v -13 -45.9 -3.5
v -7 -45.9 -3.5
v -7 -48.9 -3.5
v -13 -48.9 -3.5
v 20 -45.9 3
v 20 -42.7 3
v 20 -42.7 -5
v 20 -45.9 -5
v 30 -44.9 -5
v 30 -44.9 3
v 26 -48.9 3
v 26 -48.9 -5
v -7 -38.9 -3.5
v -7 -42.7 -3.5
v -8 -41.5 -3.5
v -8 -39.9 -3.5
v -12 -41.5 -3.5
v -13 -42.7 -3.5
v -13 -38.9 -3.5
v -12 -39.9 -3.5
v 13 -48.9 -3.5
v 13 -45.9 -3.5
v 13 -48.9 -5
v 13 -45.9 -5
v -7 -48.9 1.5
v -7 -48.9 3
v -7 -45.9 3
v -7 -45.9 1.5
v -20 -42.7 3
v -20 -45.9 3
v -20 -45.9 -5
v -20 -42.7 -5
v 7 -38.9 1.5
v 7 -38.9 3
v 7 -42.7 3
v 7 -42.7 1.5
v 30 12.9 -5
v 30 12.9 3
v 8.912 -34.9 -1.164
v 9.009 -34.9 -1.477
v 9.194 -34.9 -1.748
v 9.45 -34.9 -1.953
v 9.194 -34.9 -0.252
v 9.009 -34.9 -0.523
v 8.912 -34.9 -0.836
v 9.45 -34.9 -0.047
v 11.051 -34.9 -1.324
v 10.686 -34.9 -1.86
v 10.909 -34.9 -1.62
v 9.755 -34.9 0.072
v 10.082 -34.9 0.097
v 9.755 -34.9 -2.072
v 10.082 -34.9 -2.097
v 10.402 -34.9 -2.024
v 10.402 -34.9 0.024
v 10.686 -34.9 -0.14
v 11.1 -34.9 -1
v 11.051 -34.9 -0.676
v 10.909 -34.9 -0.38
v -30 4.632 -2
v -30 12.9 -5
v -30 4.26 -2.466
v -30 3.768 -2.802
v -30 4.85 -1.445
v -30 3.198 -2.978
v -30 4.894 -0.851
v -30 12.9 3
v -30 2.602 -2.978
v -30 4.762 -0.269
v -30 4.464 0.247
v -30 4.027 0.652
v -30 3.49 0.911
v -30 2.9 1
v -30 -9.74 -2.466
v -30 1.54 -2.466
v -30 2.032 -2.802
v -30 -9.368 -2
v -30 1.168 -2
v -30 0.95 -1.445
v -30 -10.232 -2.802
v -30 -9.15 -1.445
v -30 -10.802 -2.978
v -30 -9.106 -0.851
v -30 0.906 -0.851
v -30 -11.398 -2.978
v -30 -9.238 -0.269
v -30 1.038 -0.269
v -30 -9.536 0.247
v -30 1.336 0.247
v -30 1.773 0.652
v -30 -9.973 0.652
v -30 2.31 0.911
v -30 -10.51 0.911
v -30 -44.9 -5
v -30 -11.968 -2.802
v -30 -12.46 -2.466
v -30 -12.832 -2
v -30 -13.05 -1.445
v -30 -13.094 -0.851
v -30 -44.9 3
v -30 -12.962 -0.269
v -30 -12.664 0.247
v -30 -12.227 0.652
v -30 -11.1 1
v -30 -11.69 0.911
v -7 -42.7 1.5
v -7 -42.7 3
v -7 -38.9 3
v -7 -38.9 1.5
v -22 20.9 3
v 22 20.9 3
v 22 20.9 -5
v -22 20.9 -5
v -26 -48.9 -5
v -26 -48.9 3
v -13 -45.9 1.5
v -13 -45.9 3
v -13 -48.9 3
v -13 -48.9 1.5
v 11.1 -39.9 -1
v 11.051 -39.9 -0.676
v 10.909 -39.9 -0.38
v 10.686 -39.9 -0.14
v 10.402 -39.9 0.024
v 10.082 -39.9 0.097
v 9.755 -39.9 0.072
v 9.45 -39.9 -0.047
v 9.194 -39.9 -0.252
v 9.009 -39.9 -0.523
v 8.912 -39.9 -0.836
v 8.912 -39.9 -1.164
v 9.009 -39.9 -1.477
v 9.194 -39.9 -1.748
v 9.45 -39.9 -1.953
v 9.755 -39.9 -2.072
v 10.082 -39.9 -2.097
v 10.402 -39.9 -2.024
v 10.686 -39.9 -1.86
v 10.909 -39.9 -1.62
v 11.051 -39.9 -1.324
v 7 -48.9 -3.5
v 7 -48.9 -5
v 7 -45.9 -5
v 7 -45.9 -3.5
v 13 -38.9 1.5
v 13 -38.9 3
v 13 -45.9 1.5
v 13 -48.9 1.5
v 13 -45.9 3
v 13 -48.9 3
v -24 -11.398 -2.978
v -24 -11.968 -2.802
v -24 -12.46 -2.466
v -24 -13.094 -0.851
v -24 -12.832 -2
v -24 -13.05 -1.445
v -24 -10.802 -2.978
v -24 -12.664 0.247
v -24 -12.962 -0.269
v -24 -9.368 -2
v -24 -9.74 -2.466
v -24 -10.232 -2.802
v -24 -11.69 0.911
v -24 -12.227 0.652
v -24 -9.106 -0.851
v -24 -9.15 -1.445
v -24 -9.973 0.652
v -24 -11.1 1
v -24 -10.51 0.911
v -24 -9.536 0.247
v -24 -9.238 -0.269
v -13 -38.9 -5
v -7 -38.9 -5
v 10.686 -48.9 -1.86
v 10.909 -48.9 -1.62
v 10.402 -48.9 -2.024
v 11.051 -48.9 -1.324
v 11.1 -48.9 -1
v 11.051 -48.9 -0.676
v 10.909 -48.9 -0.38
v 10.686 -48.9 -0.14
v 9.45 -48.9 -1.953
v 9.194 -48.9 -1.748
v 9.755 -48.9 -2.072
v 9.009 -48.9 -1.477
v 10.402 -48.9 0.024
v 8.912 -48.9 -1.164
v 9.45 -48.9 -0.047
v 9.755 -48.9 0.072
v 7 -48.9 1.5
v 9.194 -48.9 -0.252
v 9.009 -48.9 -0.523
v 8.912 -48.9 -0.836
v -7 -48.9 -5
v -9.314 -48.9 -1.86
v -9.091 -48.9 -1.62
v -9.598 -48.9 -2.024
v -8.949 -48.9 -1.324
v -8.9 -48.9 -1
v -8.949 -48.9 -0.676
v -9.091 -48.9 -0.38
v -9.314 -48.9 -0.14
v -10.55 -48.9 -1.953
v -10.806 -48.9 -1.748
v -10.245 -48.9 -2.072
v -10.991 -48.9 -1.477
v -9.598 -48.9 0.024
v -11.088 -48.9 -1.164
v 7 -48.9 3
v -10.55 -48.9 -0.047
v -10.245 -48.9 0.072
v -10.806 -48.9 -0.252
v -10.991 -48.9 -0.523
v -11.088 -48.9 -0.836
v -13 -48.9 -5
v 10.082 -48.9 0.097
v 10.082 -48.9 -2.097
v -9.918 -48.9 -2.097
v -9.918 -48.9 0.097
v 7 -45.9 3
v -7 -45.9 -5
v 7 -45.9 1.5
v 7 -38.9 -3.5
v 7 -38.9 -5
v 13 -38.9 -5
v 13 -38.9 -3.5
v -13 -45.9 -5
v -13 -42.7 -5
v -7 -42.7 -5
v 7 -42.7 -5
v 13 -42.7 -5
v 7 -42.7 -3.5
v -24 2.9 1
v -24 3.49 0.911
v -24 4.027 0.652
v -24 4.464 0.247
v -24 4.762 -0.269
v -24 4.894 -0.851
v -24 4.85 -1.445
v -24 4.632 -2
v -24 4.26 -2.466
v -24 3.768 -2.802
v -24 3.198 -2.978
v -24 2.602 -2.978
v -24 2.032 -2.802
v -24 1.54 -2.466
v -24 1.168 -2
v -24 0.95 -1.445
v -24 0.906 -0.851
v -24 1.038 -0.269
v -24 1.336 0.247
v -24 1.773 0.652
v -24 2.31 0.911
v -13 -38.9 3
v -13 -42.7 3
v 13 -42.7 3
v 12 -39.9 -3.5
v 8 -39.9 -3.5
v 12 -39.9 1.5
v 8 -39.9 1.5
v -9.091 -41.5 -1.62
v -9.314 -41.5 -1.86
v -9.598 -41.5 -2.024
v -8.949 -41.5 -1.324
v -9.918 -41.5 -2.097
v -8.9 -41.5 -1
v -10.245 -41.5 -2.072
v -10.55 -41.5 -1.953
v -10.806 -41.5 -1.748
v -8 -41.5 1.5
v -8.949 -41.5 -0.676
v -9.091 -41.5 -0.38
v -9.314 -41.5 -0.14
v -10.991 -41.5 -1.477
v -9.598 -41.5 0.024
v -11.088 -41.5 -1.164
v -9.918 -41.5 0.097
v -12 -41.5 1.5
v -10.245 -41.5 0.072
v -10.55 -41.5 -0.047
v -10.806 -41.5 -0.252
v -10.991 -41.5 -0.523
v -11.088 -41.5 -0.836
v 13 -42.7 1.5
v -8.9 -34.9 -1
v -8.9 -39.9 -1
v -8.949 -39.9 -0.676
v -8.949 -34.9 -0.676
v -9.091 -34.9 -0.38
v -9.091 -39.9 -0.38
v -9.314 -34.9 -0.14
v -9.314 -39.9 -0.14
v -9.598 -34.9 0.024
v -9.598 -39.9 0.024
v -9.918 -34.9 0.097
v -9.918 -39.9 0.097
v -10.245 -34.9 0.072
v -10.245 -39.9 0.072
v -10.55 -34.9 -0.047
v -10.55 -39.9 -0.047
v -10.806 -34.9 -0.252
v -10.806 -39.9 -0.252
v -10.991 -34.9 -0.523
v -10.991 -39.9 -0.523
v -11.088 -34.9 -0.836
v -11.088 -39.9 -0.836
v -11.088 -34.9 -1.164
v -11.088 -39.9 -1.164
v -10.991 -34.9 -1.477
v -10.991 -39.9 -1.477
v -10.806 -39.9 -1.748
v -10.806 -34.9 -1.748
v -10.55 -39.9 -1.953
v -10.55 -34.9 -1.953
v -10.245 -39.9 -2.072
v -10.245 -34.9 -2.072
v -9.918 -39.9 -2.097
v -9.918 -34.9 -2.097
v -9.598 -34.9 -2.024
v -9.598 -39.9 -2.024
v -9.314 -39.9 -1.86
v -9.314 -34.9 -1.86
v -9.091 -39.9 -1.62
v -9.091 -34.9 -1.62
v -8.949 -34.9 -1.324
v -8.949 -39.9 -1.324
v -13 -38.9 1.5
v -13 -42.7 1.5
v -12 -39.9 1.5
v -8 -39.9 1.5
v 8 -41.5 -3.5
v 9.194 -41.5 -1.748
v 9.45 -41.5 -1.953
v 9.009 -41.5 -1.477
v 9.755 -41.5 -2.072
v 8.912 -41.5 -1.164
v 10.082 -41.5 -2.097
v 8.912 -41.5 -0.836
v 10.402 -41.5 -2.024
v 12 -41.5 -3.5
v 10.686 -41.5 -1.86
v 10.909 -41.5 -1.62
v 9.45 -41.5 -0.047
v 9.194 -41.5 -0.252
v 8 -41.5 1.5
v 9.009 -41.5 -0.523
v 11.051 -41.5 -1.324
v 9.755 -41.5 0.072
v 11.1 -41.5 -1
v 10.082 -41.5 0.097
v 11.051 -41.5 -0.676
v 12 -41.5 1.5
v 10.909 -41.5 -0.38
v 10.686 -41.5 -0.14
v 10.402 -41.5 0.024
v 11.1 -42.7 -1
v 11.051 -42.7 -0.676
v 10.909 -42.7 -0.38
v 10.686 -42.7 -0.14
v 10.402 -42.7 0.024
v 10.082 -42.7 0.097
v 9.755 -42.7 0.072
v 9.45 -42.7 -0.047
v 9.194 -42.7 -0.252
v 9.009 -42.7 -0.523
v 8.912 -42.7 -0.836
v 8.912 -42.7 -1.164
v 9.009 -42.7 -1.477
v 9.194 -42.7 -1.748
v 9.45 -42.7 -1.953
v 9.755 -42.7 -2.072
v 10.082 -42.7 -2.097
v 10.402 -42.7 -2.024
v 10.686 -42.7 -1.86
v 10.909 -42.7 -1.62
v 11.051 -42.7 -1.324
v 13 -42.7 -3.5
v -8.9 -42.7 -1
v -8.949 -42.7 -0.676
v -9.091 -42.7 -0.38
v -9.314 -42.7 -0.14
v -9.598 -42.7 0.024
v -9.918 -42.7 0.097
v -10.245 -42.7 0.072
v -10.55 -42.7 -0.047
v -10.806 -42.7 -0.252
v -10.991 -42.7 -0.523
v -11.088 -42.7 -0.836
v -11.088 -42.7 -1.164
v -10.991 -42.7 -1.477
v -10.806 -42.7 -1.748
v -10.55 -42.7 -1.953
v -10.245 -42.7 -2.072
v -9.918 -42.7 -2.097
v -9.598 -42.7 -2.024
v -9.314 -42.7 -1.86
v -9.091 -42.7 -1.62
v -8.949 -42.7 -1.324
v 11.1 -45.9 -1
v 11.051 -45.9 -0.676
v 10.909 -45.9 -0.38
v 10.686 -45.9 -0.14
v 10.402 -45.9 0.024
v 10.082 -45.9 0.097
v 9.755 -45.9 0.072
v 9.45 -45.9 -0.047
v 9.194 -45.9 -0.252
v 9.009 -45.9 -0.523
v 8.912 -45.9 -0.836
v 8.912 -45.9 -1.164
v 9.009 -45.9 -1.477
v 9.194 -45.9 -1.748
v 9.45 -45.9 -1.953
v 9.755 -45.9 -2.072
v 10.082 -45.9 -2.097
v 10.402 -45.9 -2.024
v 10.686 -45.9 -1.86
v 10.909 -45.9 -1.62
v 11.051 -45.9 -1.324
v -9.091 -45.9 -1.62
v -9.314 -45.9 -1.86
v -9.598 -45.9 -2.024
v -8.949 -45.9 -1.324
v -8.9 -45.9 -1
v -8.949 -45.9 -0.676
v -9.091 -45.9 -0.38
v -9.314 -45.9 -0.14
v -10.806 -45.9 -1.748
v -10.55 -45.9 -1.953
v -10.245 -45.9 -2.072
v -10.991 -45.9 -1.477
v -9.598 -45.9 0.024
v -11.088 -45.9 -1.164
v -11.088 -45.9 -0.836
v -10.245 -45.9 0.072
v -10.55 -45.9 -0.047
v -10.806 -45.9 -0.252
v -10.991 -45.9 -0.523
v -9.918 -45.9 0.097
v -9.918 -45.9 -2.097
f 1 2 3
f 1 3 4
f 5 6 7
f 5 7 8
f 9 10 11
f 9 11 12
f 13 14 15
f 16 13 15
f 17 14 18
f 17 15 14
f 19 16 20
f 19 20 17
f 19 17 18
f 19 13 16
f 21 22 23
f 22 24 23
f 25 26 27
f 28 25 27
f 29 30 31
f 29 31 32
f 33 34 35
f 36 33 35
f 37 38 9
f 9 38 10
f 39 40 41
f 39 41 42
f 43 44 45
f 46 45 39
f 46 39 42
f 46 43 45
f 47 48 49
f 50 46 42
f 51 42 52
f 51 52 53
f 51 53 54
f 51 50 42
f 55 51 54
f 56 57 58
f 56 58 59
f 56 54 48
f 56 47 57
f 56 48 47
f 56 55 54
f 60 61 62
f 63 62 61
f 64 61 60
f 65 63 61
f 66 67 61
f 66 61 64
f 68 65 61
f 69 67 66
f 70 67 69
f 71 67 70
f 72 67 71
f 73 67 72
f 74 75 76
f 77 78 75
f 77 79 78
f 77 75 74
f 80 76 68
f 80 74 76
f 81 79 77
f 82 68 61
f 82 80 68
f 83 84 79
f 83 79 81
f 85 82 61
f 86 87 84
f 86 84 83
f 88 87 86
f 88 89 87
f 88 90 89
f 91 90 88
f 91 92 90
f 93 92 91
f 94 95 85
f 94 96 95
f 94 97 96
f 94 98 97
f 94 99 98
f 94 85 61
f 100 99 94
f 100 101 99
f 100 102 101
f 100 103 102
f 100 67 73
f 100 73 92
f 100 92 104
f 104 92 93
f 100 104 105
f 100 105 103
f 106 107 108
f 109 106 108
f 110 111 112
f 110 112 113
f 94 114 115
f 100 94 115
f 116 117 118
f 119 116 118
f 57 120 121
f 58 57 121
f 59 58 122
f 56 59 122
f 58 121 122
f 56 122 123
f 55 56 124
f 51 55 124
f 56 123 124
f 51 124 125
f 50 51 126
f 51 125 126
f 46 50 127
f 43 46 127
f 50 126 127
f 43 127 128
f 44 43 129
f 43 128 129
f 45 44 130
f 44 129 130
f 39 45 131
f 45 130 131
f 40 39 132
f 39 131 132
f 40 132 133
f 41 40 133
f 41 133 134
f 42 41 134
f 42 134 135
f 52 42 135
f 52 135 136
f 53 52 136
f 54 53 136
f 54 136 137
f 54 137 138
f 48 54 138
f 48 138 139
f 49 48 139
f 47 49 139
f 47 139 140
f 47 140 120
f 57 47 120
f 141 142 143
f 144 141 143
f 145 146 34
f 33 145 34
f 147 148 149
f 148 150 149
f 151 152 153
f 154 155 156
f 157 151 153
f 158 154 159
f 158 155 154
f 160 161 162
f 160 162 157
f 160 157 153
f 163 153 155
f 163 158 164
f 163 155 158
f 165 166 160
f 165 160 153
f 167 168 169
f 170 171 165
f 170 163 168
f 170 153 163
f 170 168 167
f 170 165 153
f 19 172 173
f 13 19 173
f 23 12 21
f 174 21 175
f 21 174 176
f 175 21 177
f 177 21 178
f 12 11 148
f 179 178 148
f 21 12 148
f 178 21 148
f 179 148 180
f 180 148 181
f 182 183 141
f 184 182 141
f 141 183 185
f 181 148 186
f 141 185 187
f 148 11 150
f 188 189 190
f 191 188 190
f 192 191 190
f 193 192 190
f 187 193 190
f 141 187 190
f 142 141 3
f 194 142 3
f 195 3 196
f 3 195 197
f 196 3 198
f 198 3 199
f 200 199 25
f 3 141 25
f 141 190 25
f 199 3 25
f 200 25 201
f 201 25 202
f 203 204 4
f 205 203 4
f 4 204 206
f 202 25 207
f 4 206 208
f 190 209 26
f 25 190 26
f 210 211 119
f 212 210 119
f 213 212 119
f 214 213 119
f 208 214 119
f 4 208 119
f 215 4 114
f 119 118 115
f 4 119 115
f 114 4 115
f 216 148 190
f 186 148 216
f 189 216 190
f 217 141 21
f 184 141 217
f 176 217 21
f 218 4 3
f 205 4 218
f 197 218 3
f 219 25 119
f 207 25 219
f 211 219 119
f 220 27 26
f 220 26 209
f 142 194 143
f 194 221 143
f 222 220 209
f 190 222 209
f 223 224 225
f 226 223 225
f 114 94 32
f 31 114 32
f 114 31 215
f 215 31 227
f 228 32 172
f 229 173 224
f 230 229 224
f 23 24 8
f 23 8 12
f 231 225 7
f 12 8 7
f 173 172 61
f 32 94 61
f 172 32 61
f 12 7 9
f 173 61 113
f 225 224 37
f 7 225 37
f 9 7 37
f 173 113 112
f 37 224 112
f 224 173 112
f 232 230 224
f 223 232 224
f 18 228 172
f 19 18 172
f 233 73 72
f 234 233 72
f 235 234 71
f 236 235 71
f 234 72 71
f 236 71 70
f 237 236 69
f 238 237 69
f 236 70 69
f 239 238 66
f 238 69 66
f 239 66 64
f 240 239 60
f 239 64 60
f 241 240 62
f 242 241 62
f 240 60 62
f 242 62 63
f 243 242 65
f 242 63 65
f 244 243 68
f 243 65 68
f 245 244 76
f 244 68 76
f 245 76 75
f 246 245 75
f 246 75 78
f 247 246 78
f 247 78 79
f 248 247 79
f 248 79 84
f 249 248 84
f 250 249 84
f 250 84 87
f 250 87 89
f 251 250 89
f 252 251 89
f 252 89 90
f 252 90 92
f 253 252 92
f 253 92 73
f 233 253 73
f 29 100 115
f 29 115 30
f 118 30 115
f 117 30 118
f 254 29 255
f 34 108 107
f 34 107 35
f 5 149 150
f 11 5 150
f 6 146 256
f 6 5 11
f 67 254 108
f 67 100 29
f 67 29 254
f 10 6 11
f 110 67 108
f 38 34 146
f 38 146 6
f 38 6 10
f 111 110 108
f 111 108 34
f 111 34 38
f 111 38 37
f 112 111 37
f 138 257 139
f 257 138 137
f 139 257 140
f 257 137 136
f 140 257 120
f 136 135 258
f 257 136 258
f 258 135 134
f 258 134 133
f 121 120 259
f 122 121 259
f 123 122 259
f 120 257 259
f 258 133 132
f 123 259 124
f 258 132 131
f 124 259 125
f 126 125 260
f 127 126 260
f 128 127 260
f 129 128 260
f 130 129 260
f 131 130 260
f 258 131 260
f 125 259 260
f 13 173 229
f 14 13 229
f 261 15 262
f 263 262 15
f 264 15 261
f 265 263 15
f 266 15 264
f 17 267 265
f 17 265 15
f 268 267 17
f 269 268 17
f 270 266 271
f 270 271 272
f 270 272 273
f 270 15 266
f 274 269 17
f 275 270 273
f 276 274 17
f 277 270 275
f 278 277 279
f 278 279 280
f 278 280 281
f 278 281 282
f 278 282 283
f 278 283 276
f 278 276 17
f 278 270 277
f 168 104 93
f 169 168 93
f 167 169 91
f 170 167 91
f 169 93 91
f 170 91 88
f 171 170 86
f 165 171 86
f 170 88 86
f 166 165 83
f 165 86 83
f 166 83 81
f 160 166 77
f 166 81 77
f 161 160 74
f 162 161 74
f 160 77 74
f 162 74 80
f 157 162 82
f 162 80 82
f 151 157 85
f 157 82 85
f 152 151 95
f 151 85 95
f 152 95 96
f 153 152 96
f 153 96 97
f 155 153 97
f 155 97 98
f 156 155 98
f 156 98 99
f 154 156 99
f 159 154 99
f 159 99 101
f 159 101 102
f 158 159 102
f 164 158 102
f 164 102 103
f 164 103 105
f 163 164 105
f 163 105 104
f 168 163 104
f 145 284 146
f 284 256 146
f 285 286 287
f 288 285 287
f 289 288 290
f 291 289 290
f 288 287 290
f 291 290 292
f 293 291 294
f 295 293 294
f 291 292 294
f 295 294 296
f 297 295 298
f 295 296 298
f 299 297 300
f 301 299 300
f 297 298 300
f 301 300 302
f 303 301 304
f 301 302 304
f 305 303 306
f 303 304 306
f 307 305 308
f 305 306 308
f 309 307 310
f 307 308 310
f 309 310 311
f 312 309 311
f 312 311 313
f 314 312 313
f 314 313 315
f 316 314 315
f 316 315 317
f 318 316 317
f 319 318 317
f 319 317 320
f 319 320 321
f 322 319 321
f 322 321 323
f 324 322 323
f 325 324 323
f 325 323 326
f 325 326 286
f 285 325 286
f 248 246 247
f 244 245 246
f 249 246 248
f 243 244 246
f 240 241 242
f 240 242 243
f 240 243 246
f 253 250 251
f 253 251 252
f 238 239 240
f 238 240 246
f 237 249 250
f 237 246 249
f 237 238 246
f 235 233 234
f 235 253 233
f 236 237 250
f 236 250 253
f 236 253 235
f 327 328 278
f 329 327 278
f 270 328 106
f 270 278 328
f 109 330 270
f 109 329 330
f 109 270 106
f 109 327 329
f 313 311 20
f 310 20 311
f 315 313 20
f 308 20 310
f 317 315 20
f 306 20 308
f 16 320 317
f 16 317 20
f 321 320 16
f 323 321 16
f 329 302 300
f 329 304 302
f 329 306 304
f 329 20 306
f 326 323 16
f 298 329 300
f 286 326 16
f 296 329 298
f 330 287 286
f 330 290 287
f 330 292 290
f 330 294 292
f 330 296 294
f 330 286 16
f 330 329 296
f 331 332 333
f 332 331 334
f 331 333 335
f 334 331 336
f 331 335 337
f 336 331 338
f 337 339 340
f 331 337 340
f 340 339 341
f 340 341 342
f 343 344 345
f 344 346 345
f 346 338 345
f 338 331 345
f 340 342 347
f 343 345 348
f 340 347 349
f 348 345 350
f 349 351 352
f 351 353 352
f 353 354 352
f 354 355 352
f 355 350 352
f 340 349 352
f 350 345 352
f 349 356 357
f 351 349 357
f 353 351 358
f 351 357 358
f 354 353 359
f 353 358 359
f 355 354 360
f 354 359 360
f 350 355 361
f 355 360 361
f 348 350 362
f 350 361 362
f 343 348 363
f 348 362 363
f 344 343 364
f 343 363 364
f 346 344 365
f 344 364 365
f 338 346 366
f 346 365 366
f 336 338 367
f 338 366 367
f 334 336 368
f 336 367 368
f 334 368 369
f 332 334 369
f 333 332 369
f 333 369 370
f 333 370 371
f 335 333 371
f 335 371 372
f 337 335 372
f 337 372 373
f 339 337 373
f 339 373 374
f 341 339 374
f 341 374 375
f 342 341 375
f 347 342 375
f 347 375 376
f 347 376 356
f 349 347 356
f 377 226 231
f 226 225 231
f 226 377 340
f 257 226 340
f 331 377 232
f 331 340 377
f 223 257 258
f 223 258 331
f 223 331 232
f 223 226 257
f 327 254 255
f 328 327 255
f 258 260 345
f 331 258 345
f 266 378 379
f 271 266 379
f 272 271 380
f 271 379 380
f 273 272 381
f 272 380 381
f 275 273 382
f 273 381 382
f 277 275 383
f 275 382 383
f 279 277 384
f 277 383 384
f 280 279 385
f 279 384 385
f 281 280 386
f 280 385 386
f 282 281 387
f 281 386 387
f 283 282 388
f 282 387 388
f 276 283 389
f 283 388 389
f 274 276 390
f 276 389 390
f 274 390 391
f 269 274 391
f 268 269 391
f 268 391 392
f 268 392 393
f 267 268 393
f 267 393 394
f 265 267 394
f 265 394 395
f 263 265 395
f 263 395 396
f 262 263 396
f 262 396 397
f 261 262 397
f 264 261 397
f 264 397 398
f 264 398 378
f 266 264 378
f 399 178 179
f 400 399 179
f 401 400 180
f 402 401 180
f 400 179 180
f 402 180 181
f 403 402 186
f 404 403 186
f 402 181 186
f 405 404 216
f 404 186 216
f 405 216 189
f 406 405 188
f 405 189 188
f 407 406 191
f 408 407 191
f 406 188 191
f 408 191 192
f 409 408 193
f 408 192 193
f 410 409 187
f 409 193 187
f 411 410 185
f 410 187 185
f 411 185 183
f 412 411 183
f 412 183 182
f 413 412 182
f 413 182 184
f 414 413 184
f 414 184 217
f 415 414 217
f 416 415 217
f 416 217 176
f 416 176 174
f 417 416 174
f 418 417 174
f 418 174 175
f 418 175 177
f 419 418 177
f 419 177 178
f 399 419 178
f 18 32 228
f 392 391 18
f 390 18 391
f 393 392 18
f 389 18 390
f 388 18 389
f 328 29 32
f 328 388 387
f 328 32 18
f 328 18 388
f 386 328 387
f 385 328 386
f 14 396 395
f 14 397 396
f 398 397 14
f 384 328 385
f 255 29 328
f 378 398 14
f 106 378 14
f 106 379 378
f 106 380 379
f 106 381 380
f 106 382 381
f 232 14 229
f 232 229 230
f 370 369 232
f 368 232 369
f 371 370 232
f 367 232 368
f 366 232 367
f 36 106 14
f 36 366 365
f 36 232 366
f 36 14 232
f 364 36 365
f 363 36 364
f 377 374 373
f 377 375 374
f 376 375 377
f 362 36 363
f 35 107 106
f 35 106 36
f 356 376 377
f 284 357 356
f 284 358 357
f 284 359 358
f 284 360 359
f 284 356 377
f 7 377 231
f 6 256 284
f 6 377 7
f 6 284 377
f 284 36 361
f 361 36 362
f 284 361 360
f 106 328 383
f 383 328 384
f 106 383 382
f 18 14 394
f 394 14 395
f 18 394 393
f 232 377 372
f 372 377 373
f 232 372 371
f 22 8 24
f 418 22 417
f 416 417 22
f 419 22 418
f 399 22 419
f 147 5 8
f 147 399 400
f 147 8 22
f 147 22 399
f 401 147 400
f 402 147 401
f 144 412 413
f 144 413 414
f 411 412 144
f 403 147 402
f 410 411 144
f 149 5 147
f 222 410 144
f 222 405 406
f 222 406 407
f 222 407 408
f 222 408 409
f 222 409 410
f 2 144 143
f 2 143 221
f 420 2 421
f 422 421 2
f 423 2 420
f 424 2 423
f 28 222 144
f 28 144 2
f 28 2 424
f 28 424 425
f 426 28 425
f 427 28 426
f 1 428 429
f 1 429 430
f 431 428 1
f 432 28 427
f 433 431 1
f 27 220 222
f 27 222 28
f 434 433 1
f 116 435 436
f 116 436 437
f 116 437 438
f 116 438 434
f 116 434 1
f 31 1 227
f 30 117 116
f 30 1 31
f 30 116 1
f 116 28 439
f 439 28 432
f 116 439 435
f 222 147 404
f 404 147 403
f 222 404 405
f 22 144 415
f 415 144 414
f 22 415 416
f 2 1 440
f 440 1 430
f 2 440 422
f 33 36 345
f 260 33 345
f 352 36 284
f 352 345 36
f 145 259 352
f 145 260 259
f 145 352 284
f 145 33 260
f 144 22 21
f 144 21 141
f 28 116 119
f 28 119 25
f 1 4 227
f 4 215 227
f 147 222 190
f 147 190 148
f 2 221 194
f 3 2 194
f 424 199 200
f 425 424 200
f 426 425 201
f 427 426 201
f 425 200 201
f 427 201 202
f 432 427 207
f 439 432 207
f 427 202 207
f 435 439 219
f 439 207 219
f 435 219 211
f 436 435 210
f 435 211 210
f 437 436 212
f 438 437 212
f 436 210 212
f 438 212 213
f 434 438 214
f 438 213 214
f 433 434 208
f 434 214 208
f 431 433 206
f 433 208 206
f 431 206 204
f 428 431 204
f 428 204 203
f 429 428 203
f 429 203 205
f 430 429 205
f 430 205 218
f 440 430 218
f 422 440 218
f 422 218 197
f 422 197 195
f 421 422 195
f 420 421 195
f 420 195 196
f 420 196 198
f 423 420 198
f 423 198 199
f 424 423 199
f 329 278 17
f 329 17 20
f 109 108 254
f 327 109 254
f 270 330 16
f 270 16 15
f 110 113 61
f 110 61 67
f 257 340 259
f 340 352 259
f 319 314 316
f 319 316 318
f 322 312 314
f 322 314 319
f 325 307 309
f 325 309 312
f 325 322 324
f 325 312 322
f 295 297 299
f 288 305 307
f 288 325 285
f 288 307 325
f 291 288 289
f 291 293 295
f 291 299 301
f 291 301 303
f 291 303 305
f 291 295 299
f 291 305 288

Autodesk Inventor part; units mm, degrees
ref_plane "YZ Plane" through (0, 0, 0) normal (1, 0, 0) x (0, 1, 0)
sketch "Эскиз1" plane through (0, 0, 0) normal (0, 0, 1) x (1, 0, 0)
  line L0 (16.9838, 20.6364) -> (20.6364, 16.9838) projected
  arc A0 (16.9838, 20.6364) -> (16.3474, 20.9) centre (16.3474, 20) ccw projected
  line L1 (-16.3474, 20.9) -> (16.3474, 20.9) projected
  arc A1 (-16.3474, 20.9) -> (-16.9838, 20.6364) centre (-16.3474, 20) ccw projected
  line L2 (-20.6364, 16.9838) -> (-16.9838, 20.6364) projected
  arc A2 (-20.6364, 16.9838) -> (-20.9, 16.3474) centre (-20, 16.3474) ccw projected
  line L3 (-20.9, -16.3474) -> (-20.9, 16.3474) projected
  arc A3 (-20.9, -16.3474) -> (-20.6364, -16.9838) centre (-20, -16.3474) ccw projected
  line L4 (-16.9838, -20.6364) -> (-20.6364, -16.9838) projected
  arc A4 (-16.9838, -20.6364) -> (-16.3474, -20.9) centre (-16.3474, -20) ccw projected
  line L5 (16.3474, -20.9) -> (-16.3474, -20.9) projected
  arc A5 (16.3474, -20.9) -> (16.9838, -20.6364) centre (16.3474, -20) ccw projected
  line L6 (20.6364, -16.9838) -> (16.9838, -20.6364) projected
  arc A6 (20.6364, -16.9838) -> (20.9, -16.3474) centre (20, -16.3474) ccw projected
  line L7 (20.9, 16.3474) -> (20.9, -16.3474) projected
  arc A7 (20.9, 16.3474) -> (20.6364, 16.9838) centre (20, 16.3474) ccw projected
  circle A8 centre (15.5574, -15.5574) radius 1.45 projected
  circle A9 centre (0, 0) radius 11 projected
  circle A10 centre (-15.5574, -15.5574) radius 1.45 projected
  circle A11 centre (-15.5574, 15.5574) radius 1.45 projected
  circle A12 centre (15.5574, 15.5574) radius 1.45 projected
  point P0 (0, 0)
extrude "Выдавливание1" add sketch "Эскиз1" along normal blind 3
sketch "Эскиз2" plane through (0, 0, 3) normal (0, 0, 1) x (1, 0, 0)
  line L0 (16.3474, 20.9) -> (-16.3474, 20.9) construction
  line L1 (-30, -20.9) -> (30, -20.9)
  line L2 (30, -20.9) -> (30, 20.9)
  line L3 (30, 20.9) -> (-30, 20.9)
  line L4 (-30, 20.9) -> (-30, -20.9)
  circle A0 centre (0, 0) radius 11 construction
  line L5 (-30, -20.9) -> (30, 20.9) construction
  line L6 (30, -20.9) -> (-30, 20.9) construction
  line L7 (-30, -20.9) -> (30, -20.9)
  line L8 (30, -20.9) -> (30, -48.9)
  line L9 (30, -48.9) -> (-30, -48.9)
  line L10 (-30, -48.9) -> (-30, -20.9)
  line L11 (-16.9838, 20.6364) -> (-20.6364, 16.9838) projected
  arc A1 (-20.6364, 16.9838) -> (-20.9, 16.3474) centre (-20, 16.3474) ccw projected
  line L12 (-20.9, 16.3474) -> (-20.9, -16.3474) projected
  arc A2 (-20.9, -16.3474) -> (-20.6364, -16.9838) centre (-20, -16.3474) ccw projected
  line L13 (-20.6364, -16.9838) -> (-16.9838, -20.6364) projected
  arc A3 (-16.9838, -20.6364) -> (-16.3474, -20.9) centre (-16.3474, -20) ccw projected
  line L14 (-16.3474, -20.9) -> (16.3474, -20.9) projected
  arc A4 (16.3474, -20.9) -> (16.9838, -20.6364) centre (16.3474, -20) ccw projected
  line L15 (16.9838, -20.6364) -> (20.6364, -16.9838) projected
  arc A5 (20.6364, -16.9838) -> (20.9, -16.3474) centre (20, -16.3474) ccw projected
  line L16 (20.9, -16.3474) -> (20.9, 16.3474) projected
  arc A6 (20.9, 16.3474) -> (20.6364, 16.9838) centre (20, 16.3474) ccw projected
  line L17 (20.6364, 16.9838) -> (16.9838, 20.6364) projected
  arc A7 (16.9838, 20.6364) -> (16.3474, 20.9) centre (16.3474, 20) ccw projected
  line L18 (16.3474, 20.9) -> (-16.3474, 20.9) projected
  arc A8 (-16.3474, 20.9) -> (-16.9838, 20.6364) centre (-16.3474, 20) ccw projected
  circle A9 centre (0, 0) radius 11 construction
  circle A10 centre (15.5574, 15.5574) radius 1.45 construction
  circle A11 centre (-15.5574, 15.5574) radius 1.45 construction
  circle A12 centre (-15.5574, -15.5574) radius 1.45 construction
  circle A13 centre (15.5574, -15.5574) radius 1.45 construction
  dimension "d4" = 60
  dimension "d5" = 60
  dimension "d6" = 28
extrude "Выдавливание2" add sketch "Эскиз2" against normal blind 8
ref_plane "РабПлоскость4" through (-23, -29.9, -1) normal (0, -1, 0) x (1, 0, 0)
chamfer "Фаска1" distance 4 angle 45 2 edges at (30, -48.9, -1) (-30, -48.9, -1)
chamfer "Фаска2" distance 8 angle 45 2 edges at (30, 20.9, -1) (-30, 20.9, -1)
sketch "Эскиз14" plane through (-30, -44.9, -5) normal (-1, 0, 0) x (0, 0, 1)
  line L0 (0, 57.8) -> (8, 57.8) construction
  line L1 (0, 0) -> (0, 57.8) construction
  line L2 (8, 0) -> (0, 0) construction
  line L3 (8, 57.8) -> (8, 0) construction
  line L4 (8, 57.8) -> (0, 57.8) projected
  line L5 (4, 57.8) -> (4, 0) construction
  line L6 (8, 0) -> (0, 0) projected
  circle A0 centre (4, 47.8) radius 2
  circle A1 centre (4, 33.8) radius 2
  dimension "d107" = 4
  dimension "d108" = 4
  dimension "d109" = 10
  dimension "d113" = 14
extrude "Выдавливание13" cut sketch "Эскиз14" against normal blind 6
sketch "Эскиз25" plane through (0, 0, 3) normal (0, 0, 1) x (1, 0, 0)
  line L0 (-20, -42.7) -> (20, -42.7)
  line L1 (20, -42.7) -> (20, -45.9)
  line L2 (20, -45.9) -> (-20, -45.9)
  line L3 (-20, -45.9) -> (-20, -42.7)
  line L4 (-20, -42.7) -> (20, -45.9) construction
  line L5 (20, -42.7) -> (-20, -45.9) construction
  line L6 (-26, -48.9) -> (26, -48.9) construction
  line L7 (26, -48.9) -> (-26, -48.9) projected
  line L8 (0, -48.9) -> (0, 20.9) construction
  line L9 (16.3474, 20.9) -> (-16.3474, 20.9) construction
  point P0 (0, 0)
  point P1 (0, -44.3)
  dimension "d170" = 40
  dimension "d171" = 3.2
  dimension "d172" = 3
extrude "Выдавливание25" cut sketch "Эскиз25" against normal blind 8
sketch "Эскиз27" plane through (-26, -48.9, 3) normal (0, -1, 0) x (1, 0, 0)
  line L0 (0, -8) -> (0, 0) construction
  line L1 (52, 0) -> (52, -8) construction
  line L2 (0, -4) -> (52, -4) construction
  circle A0 centre (16, -4) radius 1.1
  line L3 (46, 0) -> (46, -8) construction
  line L4 (6, 0) -> (46, 0) construction
  line L5 (46, 0) -> (46, -8) construction
  line L6 (46, -8) -> (6, -8) construction
  line L7 (6, -8) -> (6, 0) construction
  line L8 (6, 0) -> (46, -8) construction
  line L9 (46, 0) -> (6, -8) construction
  circle A1 centre (36, -4) radius 1.1
  point P0 (26, -4)
  dimension "d177" = 2.2
  dimension "d178" = 10
  dimension "d179" = 2.2
  dimension "d180" = 10
extrude "Выдавливание26" cut sketch "Эскиз27" against normal blind 14
sketch "Эскиз28" plane through (0, 0, 3) normal (0, 0, 1) x (1, 0, 0)
  line L0 (20, -45.9) -> (-20, -45.9) construction
  line L1 (-20, -45.9) -> (-20, -42.7) construction
  line L2 (-20, -42.7) -> (20, -42.7) construction
  line L3 (20, -42.7) -> (20, -45.9) construction
  line L4 (-26, -48.9) -> (26, -48.9) projected
  line L5 (-13, -48.9) -> (-7, -48.9)
  line L6 (-7, -48.9) -> (-7, -38.9)
  line L7 (-7, -38.9) -> (-13, -38.9)
  line L8 (-13, -38.9) -> (-13, -48.9)
  line L9 (-10, -38.9) -> (-10, -48.9) construction
  point P0 (0, 0)
  point P1 (-10, -43.9)
  point P2 (-20, -44.3)
  dimension "d183" = 6
  dimension "d184" = 10
  dimension "d185" = 10
extrude "Выдавливание27" cut sketch "Эскиз28" against normal blind 1.5
ref_plane "РабПлоскость8" through (0, 0, -1) normal (0, 0, -1) x (-1, 0, 0)
mirror "Зеркальное отражение4" about plane through (0, 0, 0) normal (1, 0, 0) of "Выдавливание27"
mirror "Зеркальное отражение5" about plane through (0, 0, -1) normal (0, 0, -1) of "Выдавливание27", "Зеркальное отражение4"
sketch "Эскиз29" plane through (0, 0, 1.5) normal (0, 0, 1) x (1, 0, 0)
  line L0 (-13, -38.9) -> (-7, -38.9) construction
  line L1 (-13, -42.7) -> (-13, -38.9) construction
  line L2 (7, -42.7) -> (7, -38.9) construction
  line L3 (7, -38.9) -> (13, -38.9) construction
  line L4 (-13, -38.9) -> (-7, -38.9) projected
  line L5 (-10, -38.9) -> (-10, -42.7) construction
  line L6 (-12, -39.9) -> (-8, -39.9)
  line L7 (-8, -39.9) -> (-8, -41.5)
  line L8 (-8, -41.5) -> (-12, -41.5)
  line L9 (-12, -41.5) -> (-12, -39.9)
  line L10 (-12, -39.9) -> (-8, -41.5) construction
  line L11 (-8, -39.9) -> (-12, -41.5) construction
  line L12 (-13, -42.7) -> (-7, -42.7) projected
  line L13 (7, -48.9) -> (-7, -48.9) construction
  line L14 (0, -48.9) -> (0, -38.1038) construction
  line L15 (12, -39.9) -> (8, -39.9)
  line L16 (8, -39.9) -> (8, -41.5)
  line L17 (8, -41.5) -> (12, -41.5)
  line L18 (12, -41.5) -> (12, -39.9)
  point P0 (0, 0)
  point P1 (-10, -40.7)
  dimension "d188" = 4
  dimension "d189" = 1.6
  dimension "d190" = 1.2
extrude "Выдавливание28" cut sketch "Эскиз29" against normal blind 10
properties part number "каретка_м2_без_м"
